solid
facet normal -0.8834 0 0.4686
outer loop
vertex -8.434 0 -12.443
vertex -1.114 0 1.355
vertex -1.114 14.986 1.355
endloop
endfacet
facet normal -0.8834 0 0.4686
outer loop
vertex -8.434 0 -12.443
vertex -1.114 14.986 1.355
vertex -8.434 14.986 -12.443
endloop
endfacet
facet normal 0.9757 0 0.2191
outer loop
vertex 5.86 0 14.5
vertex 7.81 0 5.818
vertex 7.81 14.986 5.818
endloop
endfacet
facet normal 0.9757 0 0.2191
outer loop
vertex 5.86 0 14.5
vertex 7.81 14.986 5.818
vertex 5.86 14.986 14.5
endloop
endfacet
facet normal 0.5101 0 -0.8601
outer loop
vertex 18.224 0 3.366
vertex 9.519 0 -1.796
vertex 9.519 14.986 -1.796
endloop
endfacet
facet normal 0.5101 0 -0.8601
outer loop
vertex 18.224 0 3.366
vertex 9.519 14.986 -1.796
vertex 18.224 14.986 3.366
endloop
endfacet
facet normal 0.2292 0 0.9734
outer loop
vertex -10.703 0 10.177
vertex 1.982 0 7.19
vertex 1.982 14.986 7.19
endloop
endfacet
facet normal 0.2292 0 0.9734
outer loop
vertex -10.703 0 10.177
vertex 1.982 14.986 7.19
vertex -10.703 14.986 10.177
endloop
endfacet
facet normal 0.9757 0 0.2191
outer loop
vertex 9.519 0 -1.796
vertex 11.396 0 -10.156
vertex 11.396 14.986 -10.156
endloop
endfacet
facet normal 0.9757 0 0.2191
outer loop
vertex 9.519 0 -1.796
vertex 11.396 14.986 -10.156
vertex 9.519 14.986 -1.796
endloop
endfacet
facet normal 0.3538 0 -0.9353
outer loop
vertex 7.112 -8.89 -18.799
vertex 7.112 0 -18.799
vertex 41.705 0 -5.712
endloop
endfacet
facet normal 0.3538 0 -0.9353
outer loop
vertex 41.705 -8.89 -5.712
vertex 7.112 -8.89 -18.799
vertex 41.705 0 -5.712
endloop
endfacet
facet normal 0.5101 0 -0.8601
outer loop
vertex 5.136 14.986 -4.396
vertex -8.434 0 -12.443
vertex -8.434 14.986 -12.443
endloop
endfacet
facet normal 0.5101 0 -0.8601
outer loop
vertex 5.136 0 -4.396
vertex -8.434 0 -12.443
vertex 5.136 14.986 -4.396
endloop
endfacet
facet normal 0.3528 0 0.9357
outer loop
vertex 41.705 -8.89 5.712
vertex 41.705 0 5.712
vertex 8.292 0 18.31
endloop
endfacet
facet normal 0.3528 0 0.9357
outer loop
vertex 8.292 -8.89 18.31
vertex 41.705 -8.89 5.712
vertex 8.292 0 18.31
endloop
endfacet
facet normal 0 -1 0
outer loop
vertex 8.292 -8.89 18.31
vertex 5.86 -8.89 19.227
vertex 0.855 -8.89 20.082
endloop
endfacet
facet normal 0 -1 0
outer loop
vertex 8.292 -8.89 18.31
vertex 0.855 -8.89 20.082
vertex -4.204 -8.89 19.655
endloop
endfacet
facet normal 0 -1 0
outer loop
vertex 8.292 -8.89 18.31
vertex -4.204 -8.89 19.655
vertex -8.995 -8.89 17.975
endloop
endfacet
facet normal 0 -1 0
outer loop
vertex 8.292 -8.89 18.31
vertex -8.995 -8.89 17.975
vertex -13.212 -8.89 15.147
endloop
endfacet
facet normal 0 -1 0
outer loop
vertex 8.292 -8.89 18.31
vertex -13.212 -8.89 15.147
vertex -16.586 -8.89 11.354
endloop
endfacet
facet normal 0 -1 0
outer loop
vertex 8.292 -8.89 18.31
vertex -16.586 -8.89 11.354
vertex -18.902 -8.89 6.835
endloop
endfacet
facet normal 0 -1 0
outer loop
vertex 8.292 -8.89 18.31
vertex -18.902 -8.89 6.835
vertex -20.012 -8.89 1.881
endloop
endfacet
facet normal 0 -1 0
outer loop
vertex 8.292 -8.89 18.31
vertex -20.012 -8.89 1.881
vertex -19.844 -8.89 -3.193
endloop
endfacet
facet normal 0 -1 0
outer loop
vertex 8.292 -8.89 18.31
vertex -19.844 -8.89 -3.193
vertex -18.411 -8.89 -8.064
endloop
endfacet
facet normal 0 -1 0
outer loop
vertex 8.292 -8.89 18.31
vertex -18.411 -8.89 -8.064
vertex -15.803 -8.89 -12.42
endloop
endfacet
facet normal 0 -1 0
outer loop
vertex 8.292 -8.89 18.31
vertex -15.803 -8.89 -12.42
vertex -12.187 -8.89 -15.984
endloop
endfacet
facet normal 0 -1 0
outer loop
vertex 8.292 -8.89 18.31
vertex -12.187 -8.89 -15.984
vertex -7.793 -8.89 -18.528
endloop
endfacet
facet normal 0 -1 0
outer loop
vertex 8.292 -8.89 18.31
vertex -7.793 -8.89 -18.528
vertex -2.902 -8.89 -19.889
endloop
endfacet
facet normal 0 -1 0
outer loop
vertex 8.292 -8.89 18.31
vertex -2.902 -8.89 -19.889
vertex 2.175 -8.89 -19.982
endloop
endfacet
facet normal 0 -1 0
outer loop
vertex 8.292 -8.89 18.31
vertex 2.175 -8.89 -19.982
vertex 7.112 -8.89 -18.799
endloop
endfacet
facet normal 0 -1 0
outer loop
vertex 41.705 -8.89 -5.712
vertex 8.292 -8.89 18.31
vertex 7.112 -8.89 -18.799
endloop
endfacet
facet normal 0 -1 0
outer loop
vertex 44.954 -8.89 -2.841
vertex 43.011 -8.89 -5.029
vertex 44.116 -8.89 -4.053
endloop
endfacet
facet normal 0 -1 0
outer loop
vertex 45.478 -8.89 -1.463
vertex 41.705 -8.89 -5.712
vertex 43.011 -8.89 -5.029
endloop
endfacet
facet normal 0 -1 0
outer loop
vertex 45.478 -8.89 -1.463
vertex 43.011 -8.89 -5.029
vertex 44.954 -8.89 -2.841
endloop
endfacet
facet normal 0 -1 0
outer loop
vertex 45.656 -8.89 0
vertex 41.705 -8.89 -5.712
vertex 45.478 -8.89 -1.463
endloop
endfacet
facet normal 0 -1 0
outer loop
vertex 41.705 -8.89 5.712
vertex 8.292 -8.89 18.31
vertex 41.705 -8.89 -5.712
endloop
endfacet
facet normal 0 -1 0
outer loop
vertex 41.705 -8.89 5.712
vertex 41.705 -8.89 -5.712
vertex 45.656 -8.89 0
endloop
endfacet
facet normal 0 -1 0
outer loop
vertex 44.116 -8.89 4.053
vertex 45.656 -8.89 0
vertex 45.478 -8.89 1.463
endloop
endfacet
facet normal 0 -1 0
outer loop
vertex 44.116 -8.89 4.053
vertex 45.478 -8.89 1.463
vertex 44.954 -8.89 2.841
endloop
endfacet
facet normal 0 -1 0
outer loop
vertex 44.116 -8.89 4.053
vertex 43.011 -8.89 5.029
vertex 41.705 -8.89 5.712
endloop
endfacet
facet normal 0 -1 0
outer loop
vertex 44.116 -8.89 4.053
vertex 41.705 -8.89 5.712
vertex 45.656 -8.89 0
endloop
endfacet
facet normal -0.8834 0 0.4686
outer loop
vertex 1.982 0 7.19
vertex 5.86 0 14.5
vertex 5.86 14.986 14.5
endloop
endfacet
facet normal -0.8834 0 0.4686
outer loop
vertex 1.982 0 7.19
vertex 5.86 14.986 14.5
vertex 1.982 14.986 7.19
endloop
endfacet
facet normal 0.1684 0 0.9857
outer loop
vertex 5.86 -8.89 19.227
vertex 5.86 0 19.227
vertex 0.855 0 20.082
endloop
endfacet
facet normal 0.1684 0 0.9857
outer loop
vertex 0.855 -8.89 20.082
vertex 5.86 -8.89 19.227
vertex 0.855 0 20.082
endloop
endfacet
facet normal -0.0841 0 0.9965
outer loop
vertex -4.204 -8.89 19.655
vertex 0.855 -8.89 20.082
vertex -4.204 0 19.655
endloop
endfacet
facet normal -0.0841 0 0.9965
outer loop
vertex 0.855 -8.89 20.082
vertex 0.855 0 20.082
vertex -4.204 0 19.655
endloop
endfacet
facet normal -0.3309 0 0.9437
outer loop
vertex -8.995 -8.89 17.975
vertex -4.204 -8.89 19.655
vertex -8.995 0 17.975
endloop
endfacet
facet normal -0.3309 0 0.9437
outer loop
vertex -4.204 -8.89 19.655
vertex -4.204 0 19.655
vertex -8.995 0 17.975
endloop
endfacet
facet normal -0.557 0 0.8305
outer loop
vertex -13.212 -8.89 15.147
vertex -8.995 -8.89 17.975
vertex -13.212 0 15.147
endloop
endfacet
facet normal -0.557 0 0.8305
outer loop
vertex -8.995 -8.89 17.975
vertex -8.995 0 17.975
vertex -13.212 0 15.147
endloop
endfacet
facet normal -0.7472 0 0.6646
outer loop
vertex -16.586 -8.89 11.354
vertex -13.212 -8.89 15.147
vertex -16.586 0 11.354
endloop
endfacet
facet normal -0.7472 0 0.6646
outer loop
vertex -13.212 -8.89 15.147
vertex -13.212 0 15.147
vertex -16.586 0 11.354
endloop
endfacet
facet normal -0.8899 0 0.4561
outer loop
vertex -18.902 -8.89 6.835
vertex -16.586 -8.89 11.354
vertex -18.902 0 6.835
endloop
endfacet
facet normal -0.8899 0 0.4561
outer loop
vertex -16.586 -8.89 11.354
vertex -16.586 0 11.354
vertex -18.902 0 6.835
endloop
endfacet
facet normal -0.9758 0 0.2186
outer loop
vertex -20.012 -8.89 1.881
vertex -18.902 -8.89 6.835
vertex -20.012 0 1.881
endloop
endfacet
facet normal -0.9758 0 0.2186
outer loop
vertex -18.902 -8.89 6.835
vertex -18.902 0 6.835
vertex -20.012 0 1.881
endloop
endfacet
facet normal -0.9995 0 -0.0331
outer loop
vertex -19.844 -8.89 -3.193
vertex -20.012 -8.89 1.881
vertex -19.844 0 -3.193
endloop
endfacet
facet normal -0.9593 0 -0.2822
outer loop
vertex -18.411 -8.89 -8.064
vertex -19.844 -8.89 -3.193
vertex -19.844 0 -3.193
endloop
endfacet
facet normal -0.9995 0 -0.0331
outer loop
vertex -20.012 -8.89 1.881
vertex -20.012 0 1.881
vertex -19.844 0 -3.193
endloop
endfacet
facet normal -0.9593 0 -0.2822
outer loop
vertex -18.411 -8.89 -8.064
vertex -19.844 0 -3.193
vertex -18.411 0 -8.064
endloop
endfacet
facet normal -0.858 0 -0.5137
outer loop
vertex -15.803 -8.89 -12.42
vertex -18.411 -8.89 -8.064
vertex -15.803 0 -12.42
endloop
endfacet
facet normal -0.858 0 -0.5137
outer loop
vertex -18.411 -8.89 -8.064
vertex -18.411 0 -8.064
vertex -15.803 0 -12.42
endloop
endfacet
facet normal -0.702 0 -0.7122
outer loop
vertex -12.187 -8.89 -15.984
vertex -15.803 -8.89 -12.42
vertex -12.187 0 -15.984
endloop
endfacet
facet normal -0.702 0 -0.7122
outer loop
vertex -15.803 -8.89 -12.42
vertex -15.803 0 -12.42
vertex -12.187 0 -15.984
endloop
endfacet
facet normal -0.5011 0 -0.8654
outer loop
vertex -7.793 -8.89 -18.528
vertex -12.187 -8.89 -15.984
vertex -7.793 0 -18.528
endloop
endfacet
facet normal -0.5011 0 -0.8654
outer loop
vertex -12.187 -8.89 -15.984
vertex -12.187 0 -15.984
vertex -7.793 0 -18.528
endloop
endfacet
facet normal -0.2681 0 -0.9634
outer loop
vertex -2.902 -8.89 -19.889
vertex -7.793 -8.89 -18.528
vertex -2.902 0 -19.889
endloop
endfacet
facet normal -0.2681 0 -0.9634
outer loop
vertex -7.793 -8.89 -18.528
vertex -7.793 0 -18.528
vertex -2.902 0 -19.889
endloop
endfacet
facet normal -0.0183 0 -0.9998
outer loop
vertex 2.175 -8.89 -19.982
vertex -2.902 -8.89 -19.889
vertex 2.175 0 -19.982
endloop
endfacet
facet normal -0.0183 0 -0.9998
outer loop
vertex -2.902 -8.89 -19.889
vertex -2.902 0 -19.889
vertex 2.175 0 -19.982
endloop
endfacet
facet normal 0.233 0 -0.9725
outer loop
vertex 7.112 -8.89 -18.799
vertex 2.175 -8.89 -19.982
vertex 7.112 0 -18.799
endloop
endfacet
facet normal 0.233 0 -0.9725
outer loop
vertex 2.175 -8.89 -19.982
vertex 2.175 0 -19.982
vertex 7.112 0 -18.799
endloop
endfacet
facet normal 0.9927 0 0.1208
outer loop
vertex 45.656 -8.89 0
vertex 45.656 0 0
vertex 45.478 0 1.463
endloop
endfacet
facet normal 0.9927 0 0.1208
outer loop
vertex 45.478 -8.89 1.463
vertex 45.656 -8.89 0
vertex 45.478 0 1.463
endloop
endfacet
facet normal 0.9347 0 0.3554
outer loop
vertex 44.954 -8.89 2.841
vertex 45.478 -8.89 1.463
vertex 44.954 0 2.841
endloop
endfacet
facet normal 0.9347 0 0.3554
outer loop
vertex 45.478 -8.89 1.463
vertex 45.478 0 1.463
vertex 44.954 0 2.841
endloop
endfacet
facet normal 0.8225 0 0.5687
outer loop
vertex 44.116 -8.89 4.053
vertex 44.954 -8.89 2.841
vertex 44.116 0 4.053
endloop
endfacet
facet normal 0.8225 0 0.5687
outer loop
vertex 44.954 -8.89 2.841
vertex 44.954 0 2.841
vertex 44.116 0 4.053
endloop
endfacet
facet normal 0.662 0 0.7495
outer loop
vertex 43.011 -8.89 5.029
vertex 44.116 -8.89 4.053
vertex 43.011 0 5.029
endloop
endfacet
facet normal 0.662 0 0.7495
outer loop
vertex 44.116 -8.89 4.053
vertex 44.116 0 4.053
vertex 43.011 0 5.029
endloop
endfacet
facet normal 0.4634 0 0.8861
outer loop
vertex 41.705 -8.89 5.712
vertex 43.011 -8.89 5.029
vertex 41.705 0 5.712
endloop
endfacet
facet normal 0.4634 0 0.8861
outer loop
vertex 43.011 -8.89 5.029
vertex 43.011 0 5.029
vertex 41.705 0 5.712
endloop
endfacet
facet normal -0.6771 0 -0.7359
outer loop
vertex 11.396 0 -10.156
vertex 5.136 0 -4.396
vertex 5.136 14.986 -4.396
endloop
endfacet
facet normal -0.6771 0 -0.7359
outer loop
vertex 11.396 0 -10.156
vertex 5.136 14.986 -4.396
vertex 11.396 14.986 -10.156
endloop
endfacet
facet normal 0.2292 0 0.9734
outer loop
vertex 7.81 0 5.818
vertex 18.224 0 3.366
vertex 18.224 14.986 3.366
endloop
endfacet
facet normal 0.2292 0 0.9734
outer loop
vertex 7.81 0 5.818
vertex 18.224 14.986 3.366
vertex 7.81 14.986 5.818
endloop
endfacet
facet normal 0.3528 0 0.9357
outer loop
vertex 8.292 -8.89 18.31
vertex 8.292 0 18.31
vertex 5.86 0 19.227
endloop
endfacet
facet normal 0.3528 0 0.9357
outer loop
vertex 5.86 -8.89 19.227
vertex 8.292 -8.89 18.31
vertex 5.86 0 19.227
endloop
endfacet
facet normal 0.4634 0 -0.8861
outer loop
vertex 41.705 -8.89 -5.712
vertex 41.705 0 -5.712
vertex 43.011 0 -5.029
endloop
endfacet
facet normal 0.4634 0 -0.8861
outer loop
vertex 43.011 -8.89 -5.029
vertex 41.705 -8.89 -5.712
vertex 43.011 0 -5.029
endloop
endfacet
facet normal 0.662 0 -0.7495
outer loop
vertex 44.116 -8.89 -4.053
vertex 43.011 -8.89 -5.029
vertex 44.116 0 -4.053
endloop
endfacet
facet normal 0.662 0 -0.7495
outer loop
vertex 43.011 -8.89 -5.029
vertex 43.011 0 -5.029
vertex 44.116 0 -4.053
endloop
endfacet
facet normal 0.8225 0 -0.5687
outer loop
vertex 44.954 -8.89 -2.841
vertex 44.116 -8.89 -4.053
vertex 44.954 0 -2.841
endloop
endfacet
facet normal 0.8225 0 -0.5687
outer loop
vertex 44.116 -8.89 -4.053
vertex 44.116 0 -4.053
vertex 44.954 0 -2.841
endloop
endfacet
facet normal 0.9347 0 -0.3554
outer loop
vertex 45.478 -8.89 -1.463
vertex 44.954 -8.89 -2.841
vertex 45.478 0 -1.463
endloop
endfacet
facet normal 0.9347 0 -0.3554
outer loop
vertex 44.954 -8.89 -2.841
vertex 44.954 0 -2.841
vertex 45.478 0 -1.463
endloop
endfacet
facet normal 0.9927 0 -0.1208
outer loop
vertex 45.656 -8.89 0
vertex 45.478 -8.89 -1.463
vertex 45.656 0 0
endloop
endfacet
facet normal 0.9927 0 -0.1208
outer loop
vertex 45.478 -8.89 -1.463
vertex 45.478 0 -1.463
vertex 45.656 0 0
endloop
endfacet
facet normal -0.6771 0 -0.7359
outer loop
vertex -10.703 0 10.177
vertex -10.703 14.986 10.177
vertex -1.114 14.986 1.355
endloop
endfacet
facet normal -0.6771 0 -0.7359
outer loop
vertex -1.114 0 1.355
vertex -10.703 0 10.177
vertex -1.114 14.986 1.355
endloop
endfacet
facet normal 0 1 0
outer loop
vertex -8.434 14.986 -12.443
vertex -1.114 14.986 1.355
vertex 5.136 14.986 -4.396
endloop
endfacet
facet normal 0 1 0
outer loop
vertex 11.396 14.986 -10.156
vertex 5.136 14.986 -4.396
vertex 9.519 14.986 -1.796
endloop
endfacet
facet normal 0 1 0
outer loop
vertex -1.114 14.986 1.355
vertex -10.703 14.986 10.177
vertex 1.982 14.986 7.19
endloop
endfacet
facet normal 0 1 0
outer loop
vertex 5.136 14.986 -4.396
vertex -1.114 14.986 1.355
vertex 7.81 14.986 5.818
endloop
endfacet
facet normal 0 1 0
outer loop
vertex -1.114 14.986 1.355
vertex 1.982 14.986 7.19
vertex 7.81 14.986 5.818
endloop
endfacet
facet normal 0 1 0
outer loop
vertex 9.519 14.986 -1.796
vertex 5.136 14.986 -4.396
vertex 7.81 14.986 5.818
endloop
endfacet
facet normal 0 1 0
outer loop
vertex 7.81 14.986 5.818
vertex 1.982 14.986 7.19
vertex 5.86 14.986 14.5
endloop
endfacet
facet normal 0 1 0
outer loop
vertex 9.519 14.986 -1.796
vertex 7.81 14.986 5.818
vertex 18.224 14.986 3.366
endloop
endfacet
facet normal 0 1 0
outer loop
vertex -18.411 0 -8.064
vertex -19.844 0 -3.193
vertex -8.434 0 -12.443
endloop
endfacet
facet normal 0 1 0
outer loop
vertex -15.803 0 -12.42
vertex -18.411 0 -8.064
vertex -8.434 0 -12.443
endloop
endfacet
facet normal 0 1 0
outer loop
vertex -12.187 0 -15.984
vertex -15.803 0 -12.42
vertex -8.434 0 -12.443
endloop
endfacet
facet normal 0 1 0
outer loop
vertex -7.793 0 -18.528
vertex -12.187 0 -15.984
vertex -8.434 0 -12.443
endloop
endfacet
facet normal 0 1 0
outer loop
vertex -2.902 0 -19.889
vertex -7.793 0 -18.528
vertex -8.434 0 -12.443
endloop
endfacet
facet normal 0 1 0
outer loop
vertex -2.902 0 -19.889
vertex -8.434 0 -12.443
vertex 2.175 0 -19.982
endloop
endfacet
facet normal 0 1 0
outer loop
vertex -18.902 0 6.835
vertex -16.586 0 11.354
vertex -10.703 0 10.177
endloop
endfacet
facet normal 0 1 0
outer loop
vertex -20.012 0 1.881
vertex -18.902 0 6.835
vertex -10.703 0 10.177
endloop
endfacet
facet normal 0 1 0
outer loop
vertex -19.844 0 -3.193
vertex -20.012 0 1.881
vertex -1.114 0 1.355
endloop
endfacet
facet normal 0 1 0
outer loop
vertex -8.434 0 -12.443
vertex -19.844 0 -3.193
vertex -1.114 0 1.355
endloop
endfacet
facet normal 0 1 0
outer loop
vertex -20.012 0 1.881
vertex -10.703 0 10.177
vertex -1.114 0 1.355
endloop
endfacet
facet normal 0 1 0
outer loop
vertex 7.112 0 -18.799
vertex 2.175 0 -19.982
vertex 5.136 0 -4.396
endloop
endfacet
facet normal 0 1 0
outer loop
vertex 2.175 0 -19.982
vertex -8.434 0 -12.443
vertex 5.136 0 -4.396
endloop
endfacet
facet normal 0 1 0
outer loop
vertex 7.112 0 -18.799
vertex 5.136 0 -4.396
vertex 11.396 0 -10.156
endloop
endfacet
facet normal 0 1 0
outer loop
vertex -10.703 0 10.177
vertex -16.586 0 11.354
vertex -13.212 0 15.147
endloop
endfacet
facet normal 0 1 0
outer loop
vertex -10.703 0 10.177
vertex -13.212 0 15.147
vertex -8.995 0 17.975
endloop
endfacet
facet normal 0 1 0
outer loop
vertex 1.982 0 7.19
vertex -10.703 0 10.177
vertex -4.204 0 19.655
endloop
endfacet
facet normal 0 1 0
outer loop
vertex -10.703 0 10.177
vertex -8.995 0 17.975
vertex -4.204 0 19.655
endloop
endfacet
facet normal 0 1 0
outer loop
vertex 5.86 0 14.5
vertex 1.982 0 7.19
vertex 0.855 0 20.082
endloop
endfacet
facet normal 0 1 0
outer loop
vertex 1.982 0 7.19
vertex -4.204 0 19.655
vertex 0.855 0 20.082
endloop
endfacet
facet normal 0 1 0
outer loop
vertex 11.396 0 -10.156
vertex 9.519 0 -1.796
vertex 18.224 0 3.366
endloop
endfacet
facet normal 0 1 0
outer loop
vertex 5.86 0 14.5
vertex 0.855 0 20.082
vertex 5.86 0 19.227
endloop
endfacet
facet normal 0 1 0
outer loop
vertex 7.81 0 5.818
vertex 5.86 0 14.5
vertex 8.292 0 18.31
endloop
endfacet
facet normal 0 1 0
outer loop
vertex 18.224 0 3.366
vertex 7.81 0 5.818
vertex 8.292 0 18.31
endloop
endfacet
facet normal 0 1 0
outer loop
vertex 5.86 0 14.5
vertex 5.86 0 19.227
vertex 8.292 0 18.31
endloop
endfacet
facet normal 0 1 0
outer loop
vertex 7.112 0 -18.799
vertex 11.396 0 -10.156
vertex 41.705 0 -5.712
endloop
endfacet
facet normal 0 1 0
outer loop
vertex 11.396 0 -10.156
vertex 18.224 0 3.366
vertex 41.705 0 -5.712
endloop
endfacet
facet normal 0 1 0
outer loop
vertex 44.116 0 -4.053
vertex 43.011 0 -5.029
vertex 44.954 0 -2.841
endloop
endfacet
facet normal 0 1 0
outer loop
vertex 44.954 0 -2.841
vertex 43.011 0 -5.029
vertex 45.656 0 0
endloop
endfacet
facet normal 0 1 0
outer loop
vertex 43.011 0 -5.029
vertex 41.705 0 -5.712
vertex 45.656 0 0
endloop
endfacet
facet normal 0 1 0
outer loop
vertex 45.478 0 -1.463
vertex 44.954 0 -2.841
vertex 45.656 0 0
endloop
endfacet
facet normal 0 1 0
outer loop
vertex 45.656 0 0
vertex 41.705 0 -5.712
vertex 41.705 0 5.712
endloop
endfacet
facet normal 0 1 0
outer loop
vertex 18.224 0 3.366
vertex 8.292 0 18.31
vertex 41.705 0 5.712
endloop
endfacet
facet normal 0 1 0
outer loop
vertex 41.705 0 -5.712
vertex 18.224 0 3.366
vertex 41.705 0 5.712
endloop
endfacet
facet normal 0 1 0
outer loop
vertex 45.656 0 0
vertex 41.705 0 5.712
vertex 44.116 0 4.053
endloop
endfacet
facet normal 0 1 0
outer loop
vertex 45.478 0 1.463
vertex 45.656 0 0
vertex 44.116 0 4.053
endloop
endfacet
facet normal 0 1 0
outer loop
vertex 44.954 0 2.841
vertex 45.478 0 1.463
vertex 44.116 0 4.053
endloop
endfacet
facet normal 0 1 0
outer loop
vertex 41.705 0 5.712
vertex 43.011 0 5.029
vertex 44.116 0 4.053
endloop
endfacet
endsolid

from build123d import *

# Parameters (mm, degrees)
F1_DEPTH = 8.89
F3_DEPTH = 23.876


with BuildPart() as f1:
    # F0 (on Front) → F1 (new body)
    with BuildSketch(Plane.XZ):
        with BuildLine():
            Line((8.2922062962, 18.3095482144), (5.8601442877, 19.2265168453))
            ThreePointArc((5.8601442877, 19.2265168453), (-20.0888672231, -0.6615548125), (7.1123886499, -18.7993129866))
            ThreePointArc((7.1123886499, -18.7993129866), (16.5371933279, -11.4245996827), (20.0997572392, 0))
            ThreePointArc((20.0997572392, 0), (16.8918852501, 10.8933215216), (8.2922062962, 18.3095482144))
        make_face()
        with BuildLine():
            ThreePointArc((20.0997572392, 0), (16.5371933279, -11.4245996827), (7.1123886499, -18.7993129866))
            Line((7.1123886499, -18.7993129866), (41.7047212119, -5.7119138))
            ThreePointArc((41.7047212119, -5.7119138), (33.4467243991, 0), (41.7047212119, 5.7119138))
            Line((41.7047212119, 5.7119138), (8.2922062962, 18.3095482144))
            ThreePointArc((8.2922062962, 18.3095482144), (16.8918852501, 10.8933215216), (20.0997572392, 0))
        make_face()
        with BuildLine():
            ThreePointArc((41.7047212119, 5.7119138), (33.4467243991, 0), (41.7047212119, -5.7119138))
            Line((41.7047212119, -5.7119138), (41.7047212119, 5.7119138))
        make_face()
        with BuildLine():
            Line((41.7047212119, 5.7119138), (41.7047212119, -5.7119138))
            ThreePointArc((41.7047212119, -5.7119138), (44.5716087418, -3.4725723137), (45.6555533566, 0))
            ThreePointArc((45.6555533566, 0), (44.5716087418, 3.4725723137), (41.7047212119, 5.7119138))
        make_face()
    extrude(amount=F1_DEPTH)

    # F2 (on face) → F3 (join)
    with BuildSketch(Plane.XZ.offset(8.89)):
        Polygon((5.8601442877, 14.4999762997), (1.981993678, 7.1901451267), (7.8095722297, 5.8180000225), align=None)
        Polygon((7.8095722297, 5.8180000225), (1.981993678, 7.1901451267), (-1.1140019774, 1.3545786852), (5.1359782959, -4.3957886373), (9.519282463, -1.7963689762), align=None)
        Polygon((1.981993678, 7.1901451267), (-10.7028093189, 10.1768728346), (-1.1140019774, 1.3545786852), align=None)
        Polygon((5.1359782959, -4.3957886373), (-1.1140019774, 1.3545786852), (-8.434349671, -12.4433655292), align=None)
        Polygon((9.519282463, -1.7963689762), (5.1359782959, -4.3957886373), (11.3962469622, -10.1556219161), align=None)
        Polygon((18.2240977883, 3.365825396), (7.8095722297, 5.8180000225), (9.519282463, -1.7963689762), align=None)
    extrude(amount=-F3_DEPTH)


solid = f1.part
